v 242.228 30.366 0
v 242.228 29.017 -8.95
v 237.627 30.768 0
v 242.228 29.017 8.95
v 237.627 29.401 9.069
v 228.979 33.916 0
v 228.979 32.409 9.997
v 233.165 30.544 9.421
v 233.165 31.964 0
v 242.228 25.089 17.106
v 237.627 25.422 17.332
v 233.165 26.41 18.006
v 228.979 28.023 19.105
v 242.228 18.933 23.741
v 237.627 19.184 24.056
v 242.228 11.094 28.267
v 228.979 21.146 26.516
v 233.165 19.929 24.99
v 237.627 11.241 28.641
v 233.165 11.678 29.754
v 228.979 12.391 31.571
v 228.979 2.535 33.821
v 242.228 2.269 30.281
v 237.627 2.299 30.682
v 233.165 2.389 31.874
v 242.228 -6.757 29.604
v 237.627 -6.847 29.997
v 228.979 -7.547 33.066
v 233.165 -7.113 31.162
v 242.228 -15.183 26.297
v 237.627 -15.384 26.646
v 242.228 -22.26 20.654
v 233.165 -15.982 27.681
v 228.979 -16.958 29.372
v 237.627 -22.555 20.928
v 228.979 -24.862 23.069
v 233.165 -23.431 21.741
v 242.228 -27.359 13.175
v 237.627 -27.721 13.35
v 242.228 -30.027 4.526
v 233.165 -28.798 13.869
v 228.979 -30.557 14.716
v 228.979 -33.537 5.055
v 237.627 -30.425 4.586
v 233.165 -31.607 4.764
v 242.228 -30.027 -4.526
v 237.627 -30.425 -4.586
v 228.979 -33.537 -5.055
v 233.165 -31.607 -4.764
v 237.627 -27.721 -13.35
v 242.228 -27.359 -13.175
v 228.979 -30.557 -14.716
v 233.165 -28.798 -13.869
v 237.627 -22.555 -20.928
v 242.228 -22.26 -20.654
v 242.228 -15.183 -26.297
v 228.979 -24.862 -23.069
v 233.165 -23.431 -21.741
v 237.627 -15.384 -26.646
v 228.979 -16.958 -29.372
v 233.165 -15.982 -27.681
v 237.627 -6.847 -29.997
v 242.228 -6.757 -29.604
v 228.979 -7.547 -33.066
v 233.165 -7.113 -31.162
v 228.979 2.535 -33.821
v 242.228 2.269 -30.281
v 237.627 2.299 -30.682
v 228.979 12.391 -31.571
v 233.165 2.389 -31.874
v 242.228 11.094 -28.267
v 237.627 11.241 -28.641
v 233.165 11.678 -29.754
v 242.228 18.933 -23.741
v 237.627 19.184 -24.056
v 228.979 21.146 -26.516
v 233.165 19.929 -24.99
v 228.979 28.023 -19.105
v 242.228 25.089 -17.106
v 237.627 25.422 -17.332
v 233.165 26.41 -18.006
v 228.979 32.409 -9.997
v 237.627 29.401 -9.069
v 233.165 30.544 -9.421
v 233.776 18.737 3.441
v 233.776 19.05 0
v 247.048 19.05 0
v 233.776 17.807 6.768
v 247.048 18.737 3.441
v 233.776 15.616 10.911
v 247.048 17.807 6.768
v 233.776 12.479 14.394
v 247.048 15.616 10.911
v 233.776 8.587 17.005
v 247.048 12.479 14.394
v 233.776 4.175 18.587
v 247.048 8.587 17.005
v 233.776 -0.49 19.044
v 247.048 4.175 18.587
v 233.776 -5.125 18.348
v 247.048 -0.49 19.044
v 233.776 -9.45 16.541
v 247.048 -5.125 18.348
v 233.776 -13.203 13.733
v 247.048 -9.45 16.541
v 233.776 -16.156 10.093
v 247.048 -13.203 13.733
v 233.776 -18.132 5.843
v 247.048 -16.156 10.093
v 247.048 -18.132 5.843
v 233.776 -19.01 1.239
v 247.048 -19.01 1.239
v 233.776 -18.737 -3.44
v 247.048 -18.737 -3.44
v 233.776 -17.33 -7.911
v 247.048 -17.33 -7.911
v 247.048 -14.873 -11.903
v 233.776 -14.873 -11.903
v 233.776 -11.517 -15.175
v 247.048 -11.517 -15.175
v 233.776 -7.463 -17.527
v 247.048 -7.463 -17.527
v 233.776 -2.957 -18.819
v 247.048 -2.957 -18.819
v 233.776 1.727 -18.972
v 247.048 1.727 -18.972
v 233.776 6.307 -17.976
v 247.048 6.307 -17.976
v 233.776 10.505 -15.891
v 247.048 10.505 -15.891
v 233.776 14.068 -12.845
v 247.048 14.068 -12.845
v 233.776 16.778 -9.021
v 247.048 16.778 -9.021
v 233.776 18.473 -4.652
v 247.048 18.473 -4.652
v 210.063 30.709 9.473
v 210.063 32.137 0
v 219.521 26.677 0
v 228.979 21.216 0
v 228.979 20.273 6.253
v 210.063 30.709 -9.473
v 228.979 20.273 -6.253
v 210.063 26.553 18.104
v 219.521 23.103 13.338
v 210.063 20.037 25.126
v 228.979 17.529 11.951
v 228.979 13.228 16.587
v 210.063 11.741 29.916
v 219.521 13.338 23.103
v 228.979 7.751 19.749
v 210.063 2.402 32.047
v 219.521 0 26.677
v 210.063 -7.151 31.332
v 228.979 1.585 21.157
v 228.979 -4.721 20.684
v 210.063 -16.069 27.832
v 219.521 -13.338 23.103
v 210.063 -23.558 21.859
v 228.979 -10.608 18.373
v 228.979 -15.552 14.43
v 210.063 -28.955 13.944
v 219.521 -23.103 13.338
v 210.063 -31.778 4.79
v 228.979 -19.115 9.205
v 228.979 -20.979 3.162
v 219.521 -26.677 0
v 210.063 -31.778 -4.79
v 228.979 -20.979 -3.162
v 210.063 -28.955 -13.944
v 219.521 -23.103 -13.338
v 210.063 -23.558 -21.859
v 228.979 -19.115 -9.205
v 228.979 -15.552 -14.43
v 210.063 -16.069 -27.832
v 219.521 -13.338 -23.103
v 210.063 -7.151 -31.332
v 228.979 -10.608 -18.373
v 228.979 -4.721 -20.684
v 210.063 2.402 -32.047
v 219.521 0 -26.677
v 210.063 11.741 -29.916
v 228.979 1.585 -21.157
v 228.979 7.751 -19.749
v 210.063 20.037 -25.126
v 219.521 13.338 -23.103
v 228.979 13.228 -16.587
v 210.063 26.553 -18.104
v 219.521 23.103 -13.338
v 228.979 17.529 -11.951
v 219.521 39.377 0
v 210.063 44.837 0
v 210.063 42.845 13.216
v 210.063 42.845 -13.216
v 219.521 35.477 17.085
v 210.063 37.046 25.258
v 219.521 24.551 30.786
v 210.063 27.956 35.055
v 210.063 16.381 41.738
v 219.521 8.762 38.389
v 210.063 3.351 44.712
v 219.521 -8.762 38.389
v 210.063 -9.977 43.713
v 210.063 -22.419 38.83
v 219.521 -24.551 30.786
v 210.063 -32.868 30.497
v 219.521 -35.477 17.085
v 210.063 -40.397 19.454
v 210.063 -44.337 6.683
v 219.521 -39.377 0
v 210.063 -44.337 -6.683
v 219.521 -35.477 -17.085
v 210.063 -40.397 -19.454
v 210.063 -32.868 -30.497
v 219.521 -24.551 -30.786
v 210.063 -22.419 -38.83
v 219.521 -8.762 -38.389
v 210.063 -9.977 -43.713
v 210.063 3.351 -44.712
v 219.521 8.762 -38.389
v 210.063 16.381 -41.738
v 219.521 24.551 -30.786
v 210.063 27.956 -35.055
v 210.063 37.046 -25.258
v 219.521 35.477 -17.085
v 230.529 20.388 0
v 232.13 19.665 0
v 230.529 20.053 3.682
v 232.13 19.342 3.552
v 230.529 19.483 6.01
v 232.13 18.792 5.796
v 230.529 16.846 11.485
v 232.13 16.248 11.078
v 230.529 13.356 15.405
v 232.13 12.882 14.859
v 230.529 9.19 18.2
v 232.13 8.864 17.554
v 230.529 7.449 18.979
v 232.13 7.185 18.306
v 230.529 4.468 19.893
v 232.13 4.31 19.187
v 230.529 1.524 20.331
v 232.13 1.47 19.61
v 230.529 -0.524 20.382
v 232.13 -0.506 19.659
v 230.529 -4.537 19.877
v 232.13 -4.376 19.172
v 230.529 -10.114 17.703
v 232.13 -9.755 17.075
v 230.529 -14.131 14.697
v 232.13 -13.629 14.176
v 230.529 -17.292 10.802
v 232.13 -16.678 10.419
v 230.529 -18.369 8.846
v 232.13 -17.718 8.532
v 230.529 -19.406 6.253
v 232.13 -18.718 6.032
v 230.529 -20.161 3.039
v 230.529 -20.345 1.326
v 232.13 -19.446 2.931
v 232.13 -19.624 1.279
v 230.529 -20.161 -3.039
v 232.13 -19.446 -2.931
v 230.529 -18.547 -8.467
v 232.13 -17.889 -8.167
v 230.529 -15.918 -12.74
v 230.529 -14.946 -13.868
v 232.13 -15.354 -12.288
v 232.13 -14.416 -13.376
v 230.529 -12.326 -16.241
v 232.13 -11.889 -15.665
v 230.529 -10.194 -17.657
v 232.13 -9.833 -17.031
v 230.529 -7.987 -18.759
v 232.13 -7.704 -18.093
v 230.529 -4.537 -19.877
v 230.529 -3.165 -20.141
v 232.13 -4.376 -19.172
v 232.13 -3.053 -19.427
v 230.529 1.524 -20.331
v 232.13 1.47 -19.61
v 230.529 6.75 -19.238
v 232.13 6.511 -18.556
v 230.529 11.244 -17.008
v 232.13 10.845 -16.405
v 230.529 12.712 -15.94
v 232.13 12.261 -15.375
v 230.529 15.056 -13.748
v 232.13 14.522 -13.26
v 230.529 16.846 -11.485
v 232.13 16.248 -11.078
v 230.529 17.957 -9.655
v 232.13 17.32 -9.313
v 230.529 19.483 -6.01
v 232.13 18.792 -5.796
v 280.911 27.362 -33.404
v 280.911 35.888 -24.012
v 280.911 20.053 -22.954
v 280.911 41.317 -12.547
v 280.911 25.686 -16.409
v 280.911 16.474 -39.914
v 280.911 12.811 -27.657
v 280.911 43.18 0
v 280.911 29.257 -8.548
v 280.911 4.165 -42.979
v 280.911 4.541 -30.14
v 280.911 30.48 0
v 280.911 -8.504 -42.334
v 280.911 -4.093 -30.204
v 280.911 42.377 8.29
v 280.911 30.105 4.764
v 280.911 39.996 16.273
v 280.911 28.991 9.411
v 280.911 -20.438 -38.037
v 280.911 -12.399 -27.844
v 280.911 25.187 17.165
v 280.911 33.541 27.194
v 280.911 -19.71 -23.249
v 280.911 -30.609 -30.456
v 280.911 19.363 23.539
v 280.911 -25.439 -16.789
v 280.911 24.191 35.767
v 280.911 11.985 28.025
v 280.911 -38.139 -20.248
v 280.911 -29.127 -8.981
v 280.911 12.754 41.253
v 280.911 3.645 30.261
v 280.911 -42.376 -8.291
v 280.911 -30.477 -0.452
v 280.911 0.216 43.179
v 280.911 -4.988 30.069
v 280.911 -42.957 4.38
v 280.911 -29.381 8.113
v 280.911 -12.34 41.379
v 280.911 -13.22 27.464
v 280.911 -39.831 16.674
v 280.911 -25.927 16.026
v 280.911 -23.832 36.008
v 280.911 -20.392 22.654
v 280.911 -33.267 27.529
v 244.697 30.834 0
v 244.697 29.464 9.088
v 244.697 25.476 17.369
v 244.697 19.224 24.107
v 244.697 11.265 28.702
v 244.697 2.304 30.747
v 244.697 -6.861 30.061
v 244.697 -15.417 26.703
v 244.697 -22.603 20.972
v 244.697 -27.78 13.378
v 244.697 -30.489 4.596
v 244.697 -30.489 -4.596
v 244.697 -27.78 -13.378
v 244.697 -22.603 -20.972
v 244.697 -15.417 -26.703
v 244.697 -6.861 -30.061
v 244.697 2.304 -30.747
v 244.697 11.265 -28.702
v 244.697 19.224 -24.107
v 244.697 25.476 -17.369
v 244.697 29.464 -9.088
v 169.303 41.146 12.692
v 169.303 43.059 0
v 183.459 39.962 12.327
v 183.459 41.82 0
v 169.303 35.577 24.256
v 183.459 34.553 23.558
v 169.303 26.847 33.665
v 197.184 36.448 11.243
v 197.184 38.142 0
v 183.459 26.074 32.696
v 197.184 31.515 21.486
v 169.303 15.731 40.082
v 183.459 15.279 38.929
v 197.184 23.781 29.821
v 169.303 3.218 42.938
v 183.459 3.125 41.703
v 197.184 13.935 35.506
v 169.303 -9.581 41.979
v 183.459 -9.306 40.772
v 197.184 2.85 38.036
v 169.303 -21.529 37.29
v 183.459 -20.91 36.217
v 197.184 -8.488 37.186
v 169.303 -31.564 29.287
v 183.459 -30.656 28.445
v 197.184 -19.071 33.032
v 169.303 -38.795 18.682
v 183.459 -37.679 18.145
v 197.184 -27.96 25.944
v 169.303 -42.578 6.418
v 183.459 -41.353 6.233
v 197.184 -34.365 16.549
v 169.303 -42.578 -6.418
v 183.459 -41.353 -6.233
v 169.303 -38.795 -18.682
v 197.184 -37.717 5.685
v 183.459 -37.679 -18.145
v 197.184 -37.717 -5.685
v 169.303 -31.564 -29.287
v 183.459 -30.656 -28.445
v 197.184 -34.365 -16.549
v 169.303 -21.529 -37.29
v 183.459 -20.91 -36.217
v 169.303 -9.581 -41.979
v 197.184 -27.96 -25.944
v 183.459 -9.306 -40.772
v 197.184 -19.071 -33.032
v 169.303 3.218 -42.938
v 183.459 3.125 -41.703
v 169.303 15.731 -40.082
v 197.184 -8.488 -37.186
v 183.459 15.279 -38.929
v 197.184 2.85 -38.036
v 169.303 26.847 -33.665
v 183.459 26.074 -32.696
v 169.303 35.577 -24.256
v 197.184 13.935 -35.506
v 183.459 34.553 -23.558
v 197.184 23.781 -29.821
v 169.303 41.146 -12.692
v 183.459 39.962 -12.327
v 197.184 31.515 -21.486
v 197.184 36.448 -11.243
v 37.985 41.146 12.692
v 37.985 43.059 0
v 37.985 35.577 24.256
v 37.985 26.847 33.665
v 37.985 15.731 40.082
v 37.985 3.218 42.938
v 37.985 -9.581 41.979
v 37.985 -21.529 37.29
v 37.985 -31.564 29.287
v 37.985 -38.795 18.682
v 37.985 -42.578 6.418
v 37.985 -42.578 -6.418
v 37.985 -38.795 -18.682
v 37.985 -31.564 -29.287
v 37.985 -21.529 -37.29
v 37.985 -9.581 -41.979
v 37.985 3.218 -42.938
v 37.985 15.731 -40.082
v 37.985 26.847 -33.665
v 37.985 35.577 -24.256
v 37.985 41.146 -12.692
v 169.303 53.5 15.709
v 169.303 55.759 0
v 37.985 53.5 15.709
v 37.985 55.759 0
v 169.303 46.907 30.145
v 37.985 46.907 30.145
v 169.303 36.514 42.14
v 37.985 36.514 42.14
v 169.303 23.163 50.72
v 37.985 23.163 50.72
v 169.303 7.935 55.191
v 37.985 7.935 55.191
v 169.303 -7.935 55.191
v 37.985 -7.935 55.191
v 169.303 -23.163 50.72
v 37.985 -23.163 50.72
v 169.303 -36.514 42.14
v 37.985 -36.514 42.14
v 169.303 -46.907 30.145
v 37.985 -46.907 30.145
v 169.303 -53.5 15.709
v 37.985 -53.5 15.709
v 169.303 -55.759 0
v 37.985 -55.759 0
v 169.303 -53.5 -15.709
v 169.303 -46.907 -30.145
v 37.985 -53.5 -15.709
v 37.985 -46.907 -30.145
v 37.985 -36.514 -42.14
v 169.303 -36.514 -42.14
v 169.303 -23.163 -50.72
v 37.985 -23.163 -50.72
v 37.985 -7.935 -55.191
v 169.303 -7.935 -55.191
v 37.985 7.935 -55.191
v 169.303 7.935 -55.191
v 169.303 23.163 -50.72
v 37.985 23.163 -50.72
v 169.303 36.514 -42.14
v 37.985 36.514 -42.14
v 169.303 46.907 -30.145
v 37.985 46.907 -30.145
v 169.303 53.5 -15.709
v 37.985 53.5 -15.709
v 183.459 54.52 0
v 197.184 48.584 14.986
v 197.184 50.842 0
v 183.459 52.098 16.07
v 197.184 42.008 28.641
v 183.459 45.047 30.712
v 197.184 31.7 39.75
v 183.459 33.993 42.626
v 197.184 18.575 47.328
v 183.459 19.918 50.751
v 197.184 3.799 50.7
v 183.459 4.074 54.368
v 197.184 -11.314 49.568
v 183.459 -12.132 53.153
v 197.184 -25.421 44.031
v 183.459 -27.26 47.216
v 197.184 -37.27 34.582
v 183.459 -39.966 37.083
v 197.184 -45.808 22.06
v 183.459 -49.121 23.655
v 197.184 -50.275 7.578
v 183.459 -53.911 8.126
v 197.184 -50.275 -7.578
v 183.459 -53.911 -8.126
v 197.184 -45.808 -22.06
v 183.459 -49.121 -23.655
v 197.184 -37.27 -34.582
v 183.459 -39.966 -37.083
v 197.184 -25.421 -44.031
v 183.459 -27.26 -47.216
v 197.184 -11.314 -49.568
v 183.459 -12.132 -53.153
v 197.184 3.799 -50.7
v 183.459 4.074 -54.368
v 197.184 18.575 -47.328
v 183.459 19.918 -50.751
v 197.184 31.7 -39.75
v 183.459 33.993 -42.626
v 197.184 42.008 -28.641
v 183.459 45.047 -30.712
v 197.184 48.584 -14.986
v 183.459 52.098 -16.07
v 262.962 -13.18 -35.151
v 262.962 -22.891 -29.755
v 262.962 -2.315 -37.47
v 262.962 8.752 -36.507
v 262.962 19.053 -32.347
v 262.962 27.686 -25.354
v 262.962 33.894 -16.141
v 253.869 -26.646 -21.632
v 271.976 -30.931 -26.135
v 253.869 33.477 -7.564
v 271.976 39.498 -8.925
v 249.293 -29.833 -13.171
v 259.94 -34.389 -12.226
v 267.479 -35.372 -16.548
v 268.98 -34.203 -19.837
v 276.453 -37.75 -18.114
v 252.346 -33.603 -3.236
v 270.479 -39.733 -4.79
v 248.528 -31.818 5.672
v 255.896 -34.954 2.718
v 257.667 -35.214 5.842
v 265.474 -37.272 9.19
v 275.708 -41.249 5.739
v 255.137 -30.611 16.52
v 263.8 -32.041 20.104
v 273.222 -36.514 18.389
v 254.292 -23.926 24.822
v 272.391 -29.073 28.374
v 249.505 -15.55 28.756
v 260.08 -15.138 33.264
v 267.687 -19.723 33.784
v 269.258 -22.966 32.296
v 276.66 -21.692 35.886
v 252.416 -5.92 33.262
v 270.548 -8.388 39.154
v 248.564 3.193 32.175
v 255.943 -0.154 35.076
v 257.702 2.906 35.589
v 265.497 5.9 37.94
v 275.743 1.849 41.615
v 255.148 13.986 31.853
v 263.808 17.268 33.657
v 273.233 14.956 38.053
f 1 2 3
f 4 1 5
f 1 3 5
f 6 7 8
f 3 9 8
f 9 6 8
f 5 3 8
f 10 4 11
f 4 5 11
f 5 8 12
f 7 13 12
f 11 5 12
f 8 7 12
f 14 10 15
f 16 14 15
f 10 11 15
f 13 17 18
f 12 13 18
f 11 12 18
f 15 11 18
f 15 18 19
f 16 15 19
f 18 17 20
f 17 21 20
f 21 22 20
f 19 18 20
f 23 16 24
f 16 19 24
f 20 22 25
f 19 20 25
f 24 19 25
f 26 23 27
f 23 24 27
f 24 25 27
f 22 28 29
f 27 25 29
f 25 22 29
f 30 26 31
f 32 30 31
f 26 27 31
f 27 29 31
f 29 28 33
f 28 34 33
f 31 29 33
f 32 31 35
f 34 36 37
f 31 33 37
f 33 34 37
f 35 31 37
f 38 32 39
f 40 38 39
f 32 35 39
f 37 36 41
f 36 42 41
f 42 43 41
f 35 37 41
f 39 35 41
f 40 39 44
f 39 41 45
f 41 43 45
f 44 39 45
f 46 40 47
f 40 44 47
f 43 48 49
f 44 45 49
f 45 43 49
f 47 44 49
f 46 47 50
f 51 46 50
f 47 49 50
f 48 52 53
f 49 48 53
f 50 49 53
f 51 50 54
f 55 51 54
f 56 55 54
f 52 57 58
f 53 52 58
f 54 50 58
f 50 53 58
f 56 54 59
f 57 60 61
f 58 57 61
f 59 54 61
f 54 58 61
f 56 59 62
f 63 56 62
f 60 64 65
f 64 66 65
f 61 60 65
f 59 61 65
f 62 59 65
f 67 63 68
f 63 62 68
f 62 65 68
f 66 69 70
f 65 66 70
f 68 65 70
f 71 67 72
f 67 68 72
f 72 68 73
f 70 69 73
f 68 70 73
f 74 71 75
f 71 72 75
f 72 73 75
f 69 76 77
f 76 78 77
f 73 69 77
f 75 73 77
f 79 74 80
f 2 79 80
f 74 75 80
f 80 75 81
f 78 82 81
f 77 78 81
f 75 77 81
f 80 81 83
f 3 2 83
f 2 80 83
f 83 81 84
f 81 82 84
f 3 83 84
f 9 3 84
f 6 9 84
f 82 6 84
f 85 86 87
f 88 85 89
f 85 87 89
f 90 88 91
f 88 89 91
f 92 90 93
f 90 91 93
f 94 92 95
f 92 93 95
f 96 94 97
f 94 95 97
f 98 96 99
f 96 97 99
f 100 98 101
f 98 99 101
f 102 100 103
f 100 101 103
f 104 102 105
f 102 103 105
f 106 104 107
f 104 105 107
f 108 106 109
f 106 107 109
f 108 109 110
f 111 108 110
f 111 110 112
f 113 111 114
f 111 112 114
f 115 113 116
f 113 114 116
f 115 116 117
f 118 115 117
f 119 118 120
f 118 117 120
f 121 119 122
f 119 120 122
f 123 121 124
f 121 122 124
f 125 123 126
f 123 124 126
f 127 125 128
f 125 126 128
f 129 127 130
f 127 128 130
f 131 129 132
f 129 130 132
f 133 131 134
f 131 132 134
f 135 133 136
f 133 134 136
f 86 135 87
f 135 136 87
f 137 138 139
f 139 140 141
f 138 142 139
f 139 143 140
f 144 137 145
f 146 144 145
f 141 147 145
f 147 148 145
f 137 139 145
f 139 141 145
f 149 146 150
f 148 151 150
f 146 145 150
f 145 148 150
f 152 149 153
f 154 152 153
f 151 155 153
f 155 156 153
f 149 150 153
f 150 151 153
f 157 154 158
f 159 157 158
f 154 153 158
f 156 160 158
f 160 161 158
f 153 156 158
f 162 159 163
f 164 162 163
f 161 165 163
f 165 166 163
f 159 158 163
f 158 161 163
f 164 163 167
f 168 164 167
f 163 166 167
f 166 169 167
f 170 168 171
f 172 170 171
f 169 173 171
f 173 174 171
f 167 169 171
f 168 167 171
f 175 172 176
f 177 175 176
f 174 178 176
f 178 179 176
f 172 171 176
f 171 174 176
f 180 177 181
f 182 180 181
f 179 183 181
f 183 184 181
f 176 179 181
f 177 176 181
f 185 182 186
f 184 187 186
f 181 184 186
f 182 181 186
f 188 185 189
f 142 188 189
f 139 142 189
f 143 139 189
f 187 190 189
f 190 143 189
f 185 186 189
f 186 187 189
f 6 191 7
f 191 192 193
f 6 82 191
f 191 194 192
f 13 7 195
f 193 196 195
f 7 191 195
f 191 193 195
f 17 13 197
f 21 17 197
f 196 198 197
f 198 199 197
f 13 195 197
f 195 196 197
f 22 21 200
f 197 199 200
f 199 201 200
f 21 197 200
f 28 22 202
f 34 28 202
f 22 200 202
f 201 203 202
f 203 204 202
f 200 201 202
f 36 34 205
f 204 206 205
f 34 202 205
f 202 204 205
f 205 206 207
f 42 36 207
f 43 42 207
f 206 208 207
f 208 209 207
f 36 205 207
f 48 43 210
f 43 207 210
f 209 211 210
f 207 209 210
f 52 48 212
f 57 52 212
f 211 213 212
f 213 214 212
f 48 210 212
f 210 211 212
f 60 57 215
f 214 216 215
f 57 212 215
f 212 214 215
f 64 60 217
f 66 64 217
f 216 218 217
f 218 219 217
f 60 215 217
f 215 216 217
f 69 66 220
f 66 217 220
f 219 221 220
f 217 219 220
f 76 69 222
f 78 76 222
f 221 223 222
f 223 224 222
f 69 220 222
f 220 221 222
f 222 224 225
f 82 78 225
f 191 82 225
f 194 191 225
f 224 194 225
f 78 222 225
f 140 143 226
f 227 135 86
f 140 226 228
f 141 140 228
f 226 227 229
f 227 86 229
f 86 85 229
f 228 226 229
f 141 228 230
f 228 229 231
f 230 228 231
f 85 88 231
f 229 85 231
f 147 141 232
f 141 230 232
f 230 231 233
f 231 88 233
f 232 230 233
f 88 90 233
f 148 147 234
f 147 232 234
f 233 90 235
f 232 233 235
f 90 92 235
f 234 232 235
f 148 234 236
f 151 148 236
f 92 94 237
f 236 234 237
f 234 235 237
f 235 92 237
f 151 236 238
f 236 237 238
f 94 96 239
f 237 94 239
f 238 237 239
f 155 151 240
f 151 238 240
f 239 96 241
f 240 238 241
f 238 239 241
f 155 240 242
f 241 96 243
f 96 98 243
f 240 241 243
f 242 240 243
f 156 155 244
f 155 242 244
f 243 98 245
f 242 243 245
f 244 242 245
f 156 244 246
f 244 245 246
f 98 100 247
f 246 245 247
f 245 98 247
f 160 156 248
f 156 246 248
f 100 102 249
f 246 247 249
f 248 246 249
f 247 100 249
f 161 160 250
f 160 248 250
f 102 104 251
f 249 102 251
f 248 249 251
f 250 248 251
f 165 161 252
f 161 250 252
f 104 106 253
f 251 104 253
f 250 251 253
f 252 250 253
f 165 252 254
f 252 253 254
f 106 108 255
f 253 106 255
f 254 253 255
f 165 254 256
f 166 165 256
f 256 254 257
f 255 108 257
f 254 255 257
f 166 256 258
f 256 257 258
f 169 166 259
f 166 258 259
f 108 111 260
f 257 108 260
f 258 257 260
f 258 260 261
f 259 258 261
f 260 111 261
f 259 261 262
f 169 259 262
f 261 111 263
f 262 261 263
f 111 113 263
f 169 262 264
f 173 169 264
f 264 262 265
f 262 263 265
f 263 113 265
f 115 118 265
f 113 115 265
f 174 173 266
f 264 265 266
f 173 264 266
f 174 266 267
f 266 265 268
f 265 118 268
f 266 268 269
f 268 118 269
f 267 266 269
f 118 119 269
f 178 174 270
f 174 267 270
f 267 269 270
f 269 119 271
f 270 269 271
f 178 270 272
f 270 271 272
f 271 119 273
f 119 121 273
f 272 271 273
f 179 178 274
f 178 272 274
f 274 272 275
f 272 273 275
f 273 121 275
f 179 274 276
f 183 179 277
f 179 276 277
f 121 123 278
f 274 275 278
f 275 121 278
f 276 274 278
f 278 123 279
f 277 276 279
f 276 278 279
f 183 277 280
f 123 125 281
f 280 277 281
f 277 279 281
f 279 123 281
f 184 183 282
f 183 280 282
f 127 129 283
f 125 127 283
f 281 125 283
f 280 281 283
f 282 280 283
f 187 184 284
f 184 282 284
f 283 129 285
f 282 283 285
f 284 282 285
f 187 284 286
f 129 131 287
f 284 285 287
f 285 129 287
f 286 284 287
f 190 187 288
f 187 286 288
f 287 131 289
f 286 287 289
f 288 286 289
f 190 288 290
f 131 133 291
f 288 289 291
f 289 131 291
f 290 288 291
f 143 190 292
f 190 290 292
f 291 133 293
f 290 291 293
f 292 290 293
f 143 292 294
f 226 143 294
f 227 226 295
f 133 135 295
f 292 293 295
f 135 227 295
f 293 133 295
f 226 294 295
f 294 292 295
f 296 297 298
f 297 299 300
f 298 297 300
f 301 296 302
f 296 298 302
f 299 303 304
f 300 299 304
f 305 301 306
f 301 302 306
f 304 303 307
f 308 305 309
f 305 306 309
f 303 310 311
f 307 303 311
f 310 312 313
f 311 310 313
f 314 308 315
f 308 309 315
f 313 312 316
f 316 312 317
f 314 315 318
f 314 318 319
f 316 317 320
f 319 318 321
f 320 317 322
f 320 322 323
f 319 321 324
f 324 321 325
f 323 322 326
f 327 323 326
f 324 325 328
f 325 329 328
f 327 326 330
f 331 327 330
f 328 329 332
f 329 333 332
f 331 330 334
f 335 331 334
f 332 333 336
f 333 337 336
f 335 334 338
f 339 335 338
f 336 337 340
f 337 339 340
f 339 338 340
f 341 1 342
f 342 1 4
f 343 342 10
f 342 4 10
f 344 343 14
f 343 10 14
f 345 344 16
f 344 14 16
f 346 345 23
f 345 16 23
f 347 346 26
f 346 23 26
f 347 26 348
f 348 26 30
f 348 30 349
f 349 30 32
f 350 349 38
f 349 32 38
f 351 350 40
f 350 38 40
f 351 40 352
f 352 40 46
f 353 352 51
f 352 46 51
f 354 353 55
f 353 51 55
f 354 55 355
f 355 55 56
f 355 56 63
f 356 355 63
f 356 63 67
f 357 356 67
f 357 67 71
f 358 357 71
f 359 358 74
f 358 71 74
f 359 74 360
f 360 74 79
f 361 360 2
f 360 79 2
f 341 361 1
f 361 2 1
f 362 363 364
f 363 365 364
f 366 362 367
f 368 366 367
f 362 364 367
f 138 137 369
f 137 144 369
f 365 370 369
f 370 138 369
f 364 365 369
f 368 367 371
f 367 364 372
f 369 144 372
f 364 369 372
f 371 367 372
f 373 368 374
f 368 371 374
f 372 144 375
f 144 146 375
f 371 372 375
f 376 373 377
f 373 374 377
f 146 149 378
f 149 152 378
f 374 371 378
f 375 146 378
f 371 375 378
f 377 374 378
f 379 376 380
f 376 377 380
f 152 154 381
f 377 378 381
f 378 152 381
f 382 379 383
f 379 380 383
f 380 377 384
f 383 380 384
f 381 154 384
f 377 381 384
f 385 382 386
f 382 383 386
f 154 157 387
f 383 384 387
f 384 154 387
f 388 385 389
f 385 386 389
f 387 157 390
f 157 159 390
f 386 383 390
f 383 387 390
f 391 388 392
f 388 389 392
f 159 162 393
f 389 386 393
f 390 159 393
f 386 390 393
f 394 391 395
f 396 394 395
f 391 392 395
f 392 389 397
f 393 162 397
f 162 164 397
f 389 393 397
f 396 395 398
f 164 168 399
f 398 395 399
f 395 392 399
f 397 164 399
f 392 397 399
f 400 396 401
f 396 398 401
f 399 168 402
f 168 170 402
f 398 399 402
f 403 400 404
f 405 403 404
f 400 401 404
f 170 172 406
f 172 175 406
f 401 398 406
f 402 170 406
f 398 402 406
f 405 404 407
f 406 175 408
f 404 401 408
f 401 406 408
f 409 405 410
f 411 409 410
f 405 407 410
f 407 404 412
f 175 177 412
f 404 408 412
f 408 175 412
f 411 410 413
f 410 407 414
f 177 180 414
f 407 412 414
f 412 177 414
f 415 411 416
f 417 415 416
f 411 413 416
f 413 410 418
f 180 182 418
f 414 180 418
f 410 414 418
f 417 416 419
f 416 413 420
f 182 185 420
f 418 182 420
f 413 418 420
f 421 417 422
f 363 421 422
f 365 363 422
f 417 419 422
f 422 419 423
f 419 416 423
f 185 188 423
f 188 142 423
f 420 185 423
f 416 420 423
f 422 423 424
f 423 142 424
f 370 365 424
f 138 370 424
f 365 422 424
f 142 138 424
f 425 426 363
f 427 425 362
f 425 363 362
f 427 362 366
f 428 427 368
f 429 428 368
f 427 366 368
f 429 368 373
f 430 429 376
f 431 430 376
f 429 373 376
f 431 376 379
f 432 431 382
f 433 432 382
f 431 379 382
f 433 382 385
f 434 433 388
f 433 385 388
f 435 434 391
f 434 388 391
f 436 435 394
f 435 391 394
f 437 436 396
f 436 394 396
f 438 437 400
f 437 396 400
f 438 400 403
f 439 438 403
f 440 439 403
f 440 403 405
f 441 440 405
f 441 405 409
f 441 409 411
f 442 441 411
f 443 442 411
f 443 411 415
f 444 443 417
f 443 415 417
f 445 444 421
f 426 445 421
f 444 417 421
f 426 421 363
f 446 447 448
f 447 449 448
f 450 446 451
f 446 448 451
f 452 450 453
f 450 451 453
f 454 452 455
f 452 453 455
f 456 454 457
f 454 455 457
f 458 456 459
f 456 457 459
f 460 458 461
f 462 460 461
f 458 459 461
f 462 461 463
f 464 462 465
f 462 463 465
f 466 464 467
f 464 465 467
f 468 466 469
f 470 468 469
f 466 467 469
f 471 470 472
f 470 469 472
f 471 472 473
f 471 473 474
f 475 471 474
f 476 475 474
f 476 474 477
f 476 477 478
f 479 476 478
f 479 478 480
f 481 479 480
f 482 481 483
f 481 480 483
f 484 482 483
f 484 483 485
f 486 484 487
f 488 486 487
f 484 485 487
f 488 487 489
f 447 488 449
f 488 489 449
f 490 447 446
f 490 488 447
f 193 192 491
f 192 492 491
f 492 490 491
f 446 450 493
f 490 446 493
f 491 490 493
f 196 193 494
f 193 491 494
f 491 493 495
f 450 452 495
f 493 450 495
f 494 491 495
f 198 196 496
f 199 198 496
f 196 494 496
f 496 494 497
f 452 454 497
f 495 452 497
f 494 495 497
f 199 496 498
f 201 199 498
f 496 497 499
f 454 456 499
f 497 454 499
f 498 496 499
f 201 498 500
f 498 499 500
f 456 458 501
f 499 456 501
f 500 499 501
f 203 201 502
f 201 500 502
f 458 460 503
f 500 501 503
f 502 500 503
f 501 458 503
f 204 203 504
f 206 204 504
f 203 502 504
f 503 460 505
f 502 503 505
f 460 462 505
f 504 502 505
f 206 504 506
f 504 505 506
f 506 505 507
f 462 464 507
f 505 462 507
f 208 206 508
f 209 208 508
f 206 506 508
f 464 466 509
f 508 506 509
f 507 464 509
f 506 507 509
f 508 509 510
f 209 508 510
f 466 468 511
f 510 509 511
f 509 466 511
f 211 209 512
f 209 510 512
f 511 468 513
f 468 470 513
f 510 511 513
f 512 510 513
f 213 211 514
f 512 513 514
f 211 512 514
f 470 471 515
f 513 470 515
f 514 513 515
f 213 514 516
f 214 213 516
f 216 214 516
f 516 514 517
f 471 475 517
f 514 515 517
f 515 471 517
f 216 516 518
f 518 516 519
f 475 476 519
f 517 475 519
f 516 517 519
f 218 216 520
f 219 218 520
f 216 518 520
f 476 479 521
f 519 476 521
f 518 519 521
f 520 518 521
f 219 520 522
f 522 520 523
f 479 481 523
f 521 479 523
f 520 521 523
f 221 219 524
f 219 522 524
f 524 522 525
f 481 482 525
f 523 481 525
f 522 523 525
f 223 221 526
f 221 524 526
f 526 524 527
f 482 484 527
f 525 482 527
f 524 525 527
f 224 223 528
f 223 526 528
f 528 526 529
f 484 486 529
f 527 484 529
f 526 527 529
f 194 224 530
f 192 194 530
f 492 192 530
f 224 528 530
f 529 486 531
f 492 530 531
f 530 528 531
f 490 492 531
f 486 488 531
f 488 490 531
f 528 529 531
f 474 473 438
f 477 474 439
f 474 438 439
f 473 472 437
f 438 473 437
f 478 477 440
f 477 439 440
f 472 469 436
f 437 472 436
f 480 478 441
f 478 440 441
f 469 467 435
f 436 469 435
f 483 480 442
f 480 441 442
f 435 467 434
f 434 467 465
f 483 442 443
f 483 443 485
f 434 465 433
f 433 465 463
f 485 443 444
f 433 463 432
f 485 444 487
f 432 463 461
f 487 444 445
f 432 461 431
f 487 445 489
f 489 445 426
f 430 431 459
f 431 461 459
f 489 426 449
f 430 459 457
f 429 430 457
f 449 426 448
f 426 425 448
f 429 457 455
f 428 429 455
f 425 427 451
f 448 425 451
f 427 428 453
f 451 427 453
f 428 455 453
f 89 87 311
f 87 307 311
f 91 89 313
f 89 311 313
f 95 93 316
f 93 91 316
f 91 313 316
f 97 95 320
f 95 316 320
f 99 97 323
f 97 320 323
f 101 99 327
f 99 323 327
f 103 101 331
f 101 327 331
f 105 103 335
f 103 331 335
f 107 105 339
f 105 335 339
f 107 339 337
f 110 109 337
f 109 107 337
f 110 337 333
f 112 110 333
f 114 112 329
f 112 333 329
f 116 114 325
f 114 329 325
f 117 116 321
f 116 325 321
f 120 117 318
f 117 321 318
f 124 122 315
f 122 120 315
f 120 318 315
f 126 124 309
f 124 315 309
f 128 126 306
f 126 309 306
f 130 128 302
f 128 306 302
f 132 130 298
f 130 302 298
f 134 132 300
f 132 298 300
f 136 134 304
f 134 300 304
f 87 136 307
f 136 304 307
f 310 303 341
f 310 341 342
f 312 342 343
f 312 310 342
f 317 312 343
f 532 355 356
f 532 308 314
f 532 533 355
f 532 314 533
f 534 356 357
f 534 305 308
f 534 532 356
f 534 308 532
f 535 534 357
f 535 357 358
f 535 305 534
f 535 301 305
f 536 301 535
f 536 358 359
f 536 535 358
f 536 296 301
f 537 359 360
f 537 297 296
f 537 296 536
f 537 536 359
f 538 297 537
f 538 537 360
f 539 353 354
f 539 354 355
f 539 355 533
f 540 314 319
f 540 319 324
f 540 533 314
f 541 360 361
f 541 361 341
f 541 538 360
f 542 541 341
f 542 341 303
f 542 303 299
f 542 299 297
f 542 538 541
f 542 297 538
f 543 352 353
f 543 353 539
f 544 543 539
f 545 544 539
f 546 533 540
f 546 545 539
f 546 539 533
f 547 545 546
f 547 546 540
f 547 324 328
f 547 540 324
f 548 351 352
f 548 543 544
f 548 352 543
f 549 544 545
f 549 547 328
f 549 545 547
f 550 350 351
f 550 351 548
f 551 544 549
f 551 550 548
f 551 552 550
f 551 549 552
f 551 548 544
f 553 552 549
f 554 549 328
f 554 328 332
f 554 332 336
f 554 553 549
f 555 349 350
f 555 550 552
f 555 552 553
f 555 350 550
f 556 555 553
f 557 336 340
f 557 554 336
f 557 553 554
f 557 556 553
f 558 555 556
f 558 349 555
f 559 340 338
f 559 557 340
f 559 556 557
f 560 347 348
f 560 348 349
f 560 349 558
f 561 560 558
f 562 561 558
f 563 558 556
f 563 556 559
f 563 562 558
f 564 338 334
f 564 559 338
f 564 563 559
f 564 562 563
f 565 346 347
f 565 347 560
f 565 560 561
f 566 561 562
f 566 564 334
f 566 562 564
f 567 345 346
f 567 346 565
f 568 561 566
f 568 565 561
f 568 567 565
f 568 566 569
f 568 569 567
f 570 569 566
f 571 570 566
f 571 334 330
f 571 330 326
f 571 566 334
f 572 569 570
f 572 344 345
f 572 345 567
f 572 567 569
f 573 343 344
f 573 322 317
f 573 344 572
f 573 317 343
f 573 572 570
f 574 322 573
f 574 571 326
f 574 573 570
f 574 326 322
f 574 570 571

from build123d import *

# Parameters (mm, degrees)
SKETCH1_W = 37.875561449
SKETCH1_H = 61.587456953
SKETCH2_W = 307.951090162
SKETCH2_H = 19.0499659


with BuildPart() as part:
    # Model → Revolve2 (revolve)
    with BuildSketch(Plane.XY):
        with BuildLine():
            Line((37.9852936, 43.0586642), (169.3032936, 43.0586642))
            ThreePointArc((169.3032936, 43.0586642), (190.401848402, 40.280985836), (210.062572, 32.1372484))
            Line((210.062572, 32.1372484), (228.979018864, 21.215832711))
            ThreePointArc((228.979018864, 21.215832711), (235.369964452, 18.568616337), (242.228293864, 17.665700111))
            ThreePointArc((242.228293864, 17.665700111), (243.484699194, 17.783691074), (244.697169154, 18.133537926))
            add(Edge.make_bspline(
                [(244.697169154, 18.133537926), (271.417135664, 28.637280911), (296.809134664, 34.644355511)],
                knots=[0, 0, 0, 1, 1, 1], degree=2))
            Line((296.809134664, 34.644355511), (297.879592264, 34.897593511))
            Line((297.879592264, 34.897593511), (296.809134664, 47.344355511))
            add(Edge.make_bspline(
                [(244.697169154, 30.833537926), (271.417135664, 41.337280911), (296.809134664, 47.344355511)],
                knots=[0, 0, 0, 1, 1, 1], degree=2))
            Line((244.697169154, 30.833537926), (242.228293864, 30.365700111))
            ThreePointArc((242.228293864, 30.365700111), (235.369964452, 31.268616337), (228.979018864, 33.915832711))
            Line((228.979018864, 33.915832711), (210.062572, 44.8372484))
            ThreePointArc((210.062572, 44.8372484), (190.401848402, 52.980985836), (169.3032936, 55.7586642))
            Line((169.3032936, 55.7586642), (37.9852936, 55.7586642))
            Line((37.9852936, 55.7586642), (37.9852936, 43.0586642))
        make_face()
    revolve(axis=Axis((0, -3.5841e-05, 0), (1, 6e-09, 0)))

    # Sketch1 → Cut-Revolve1 (revolve, cut)
    with BuildSketch(Plane.XY):
        with Locations((299.848811079, 30.793694284)):
            Rectangle(SKETCH1_W, SKETCH1_H)
    revolve(axis=Axis((280.911030354, -3.4193e-05, 0), (1, 0, 0)), mode=Mode.SUBTRACT)

    # Sketch2 → Cut-Revolve2 (revolve, cut)
    with BuildSketch(Plane.XY):
        with Locations((153.975545081, 9.52498295)):
            Rectangle(SKETCH2_W, SKETCH2_H)
    revolve(axis=Axis((0, 0, 0), (1, 0, 0)), mode=Mode.SUBTRACT)


solid = part.part
